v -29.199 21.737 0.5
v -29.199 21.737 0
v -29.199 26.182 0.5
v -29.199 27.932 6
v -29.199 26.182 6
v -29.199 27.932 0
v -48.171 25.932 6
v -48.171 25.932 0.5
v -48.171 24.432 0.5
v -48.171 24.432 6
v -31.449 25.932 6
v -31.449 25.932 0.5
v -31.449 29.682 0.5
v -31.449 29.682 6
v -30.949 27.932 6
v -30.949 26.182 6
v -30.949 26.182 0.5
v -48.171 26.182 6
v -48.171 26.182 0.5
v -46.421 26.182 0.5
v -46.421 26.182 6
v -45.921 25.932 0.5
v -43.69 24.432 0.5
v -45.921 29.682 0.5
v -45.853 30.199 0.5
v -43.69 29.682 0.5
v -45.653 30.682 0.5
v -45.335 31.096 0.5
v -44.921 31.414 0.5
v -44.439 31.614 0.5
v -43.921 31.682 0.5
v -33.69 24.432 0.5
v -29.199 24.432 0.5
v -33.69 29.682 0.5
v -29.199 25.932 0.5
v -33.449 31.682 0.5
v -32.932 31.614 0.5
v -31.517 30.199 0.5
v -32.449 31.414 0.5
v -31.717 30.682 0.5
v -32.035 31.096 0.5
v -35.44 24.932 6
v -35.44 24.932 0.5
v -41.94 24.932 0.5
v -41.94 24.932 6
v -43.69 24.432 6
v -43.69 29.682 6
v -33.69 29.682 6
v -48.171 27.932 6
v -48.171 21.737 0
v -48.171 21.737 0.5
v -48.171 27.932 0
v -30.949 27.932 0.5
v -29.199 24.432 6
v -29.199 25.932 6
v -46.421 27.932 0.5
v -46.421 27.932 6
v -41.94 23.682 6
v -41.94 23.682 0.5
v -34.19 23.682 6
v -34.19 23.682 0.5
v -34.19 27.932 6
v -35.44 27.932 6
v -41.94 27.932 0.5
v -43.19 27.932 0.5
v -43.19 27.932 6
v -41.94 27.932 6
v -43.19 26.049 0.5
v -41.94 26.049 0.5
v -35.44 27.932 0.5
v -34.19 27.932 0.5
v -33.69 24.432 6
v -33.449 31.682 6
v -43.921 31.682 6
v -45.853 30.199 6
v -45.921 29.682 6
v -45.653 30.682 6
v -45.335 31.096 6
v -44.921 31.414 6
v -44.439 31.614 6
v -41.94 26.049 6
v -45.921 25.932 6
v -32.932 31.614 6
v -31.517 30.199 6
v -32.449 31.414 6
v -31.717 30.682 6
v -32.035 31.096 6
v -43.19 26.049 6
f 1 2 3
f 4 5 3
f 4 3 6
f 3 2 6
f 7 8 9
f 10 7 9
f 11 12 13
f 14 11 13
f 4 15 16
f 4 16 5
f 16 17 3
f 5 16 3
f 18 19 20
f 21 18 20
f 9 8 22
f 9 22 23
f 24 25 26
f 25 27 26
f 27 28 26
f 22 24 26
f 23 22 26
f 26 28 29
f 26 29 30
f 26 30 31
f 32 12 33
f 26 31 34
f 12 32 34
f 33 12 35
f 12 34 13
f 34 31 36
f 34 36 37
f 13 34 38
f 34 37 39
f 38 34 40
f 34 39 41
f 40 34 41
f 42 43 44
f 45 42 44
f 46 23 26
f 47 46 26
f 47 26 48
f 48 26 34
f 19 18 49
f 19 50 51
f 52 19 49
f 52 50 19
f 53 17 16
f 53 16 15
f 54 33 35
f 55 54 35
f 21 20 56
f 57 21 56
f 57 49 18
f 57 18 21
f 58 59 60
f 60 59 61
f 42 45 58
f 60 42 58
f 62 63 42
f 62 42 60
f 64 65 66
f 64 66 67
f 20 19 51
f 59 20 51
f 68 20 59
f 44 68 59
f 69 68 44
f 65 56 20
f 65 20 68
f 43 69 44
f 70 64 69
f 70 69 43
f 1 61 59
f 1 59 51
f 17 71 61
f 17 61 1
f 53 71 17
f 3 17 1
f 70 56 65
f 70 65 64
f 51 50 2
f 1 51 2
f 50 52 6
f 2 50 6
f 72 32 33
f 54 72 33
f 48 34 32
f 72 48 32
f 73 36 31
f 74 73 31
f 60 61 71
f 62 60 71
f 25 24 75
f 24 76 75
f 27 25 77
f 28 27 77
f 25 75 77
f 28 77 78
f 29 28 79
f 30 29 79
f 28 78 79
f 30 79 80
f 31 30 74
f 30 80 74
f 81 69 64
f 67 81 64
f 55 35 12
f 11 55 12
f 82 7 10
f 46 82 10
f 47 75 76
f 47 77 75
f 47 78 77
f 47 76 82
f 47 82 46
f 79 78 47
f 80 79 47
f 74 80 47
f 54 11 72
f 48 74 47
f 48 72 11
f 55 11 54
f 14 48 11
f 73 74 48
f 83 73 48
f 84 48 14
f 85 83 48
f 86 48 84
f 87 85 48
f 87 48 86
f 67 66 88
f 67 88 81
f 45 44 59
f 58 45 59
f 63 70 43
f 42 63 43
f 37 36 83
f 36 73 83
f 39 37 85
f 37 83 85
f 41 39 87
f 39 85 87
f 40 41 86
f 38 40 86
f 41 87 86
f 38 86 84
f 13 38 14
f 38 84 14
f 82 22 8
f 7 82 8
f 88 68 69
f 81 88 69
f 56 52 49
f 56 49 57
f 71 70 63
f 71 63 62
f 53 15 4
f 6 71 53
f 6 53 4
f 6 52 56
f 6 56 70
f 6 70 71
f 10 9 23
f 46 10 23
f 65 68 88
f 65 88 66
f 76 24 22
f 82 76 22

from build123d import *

# Parameters (mm, degrees)
F1_DEPTH = 0.5
F0_W     = 1.25
F0_H     = 1.882829
F2_DEPTH = 6
F3_W     = 6.241226
F3_H     = 6.194862
F4_DEPTH = 0.5
F5_W     = 1.75
F5_H     = 1.75
F6_DEPTH = 5.5
F8_DEPTH = 5.5
F9_R     = 2
F10_R    = 2


with BuildPart() as f1:
    # F0 (on Top) → F1 (new body)
    with BuildSketch(Plane.XY):
        Polygon((-35.440375, 27.931707), (-41.940375, 27.931707), (-41.940375, 26.048878), (-41.940375, 24.931707), (-35.440375, 24.931707), align=None)
    extrude(amount=F1_DEPTH)

    # F0 (on Top) → F2 (join)
    with BuildSketch(Plane.XY):
        Polygon((-34.190375, 27.931707), (-35.440375, 27.931707), (-35.440375, 24.931707), (-41.940375, 24.931707), (-41.940375, 23.681707), (-34.190375, 23.681707), align=None)
        with Locations((-42.565375, 26.990292)):
            Rectangle(F0_W, F0_H)
    extrude(amount=F2_DEPTH)

    # F3 (on Top) → F4 (join, through all)
    with BuildSketch(Plane.XY):
        Polygon((-35.440375, 27.931707), (-41.940375, 27.931707), (-48.171132, 27.931707), (-48.171132, 21.736845), (-35.440375, 21.736845), align=None)
        with Locations((-32.319762, 24.834276)):
            Rectangle(F3_W, F3_H)
    extrude(amount=F4_DEPTH)

    # F5 (on face) → F6 (join, through all)
    with BuildSketch(Plane.XY.offset(0.5)):
        with Locations((-47.296132, 27.056707)):
            Rectangle(F5_W, F5_H)
        with Locations((-30.074149, 27.056707)):
            Rectangle(F5_W, F5_H)
    extrude(amount=F6_DEPTH)


with BuildPart() as f8:
    # F7 (on face) → F8 (new body, through all)
    with BuildSketch(Plane.XY.offset(0.5)):
        Polygon((-45.921132, 31.681707), (-45.921132, 27.931707), (-43.690375, 27.931707), (-43.690375, 29.681707), (-33.690375, 29.681707), (-33.690375, 27.931707), (-31.449149, 27.931707), (-31.449149, 31.681707), align=None)
        Polygon((-45.921132, 25.931707), (-48.171132, 25.931707), (-48.171132, 24.431707), (-43.690375, 24.431707), (-43.690375, 27.931707), (-45.921132, 27.931707), align=None)
        Polygon((-33.690375, 24.431707), (-29.199149, 24.431707), (-29.199149, 25.931707), (-31.449149, 25.931707), (-31.449149, 27.931707), (-33.690375, 27.931707), align=None)
    extrude(amount=F8_DEPTH)

    # F9
    f9_edges = [f8.edges().sort_by_distance(p)[0] for p in [
        (-45.921132, 31.681707, 3.25),
    ]]
    fillet(f9_edges, radius=F9_R)

    # F10
    f10_edges = [f8.edges().sort_by_distance(p)[0] for p in [
        (-31.449149, 31.681707, 3.25),
    ]]
    fillet(f10_edges, radius=F10_R)


solid = Compound([f1.part, f8.part])
